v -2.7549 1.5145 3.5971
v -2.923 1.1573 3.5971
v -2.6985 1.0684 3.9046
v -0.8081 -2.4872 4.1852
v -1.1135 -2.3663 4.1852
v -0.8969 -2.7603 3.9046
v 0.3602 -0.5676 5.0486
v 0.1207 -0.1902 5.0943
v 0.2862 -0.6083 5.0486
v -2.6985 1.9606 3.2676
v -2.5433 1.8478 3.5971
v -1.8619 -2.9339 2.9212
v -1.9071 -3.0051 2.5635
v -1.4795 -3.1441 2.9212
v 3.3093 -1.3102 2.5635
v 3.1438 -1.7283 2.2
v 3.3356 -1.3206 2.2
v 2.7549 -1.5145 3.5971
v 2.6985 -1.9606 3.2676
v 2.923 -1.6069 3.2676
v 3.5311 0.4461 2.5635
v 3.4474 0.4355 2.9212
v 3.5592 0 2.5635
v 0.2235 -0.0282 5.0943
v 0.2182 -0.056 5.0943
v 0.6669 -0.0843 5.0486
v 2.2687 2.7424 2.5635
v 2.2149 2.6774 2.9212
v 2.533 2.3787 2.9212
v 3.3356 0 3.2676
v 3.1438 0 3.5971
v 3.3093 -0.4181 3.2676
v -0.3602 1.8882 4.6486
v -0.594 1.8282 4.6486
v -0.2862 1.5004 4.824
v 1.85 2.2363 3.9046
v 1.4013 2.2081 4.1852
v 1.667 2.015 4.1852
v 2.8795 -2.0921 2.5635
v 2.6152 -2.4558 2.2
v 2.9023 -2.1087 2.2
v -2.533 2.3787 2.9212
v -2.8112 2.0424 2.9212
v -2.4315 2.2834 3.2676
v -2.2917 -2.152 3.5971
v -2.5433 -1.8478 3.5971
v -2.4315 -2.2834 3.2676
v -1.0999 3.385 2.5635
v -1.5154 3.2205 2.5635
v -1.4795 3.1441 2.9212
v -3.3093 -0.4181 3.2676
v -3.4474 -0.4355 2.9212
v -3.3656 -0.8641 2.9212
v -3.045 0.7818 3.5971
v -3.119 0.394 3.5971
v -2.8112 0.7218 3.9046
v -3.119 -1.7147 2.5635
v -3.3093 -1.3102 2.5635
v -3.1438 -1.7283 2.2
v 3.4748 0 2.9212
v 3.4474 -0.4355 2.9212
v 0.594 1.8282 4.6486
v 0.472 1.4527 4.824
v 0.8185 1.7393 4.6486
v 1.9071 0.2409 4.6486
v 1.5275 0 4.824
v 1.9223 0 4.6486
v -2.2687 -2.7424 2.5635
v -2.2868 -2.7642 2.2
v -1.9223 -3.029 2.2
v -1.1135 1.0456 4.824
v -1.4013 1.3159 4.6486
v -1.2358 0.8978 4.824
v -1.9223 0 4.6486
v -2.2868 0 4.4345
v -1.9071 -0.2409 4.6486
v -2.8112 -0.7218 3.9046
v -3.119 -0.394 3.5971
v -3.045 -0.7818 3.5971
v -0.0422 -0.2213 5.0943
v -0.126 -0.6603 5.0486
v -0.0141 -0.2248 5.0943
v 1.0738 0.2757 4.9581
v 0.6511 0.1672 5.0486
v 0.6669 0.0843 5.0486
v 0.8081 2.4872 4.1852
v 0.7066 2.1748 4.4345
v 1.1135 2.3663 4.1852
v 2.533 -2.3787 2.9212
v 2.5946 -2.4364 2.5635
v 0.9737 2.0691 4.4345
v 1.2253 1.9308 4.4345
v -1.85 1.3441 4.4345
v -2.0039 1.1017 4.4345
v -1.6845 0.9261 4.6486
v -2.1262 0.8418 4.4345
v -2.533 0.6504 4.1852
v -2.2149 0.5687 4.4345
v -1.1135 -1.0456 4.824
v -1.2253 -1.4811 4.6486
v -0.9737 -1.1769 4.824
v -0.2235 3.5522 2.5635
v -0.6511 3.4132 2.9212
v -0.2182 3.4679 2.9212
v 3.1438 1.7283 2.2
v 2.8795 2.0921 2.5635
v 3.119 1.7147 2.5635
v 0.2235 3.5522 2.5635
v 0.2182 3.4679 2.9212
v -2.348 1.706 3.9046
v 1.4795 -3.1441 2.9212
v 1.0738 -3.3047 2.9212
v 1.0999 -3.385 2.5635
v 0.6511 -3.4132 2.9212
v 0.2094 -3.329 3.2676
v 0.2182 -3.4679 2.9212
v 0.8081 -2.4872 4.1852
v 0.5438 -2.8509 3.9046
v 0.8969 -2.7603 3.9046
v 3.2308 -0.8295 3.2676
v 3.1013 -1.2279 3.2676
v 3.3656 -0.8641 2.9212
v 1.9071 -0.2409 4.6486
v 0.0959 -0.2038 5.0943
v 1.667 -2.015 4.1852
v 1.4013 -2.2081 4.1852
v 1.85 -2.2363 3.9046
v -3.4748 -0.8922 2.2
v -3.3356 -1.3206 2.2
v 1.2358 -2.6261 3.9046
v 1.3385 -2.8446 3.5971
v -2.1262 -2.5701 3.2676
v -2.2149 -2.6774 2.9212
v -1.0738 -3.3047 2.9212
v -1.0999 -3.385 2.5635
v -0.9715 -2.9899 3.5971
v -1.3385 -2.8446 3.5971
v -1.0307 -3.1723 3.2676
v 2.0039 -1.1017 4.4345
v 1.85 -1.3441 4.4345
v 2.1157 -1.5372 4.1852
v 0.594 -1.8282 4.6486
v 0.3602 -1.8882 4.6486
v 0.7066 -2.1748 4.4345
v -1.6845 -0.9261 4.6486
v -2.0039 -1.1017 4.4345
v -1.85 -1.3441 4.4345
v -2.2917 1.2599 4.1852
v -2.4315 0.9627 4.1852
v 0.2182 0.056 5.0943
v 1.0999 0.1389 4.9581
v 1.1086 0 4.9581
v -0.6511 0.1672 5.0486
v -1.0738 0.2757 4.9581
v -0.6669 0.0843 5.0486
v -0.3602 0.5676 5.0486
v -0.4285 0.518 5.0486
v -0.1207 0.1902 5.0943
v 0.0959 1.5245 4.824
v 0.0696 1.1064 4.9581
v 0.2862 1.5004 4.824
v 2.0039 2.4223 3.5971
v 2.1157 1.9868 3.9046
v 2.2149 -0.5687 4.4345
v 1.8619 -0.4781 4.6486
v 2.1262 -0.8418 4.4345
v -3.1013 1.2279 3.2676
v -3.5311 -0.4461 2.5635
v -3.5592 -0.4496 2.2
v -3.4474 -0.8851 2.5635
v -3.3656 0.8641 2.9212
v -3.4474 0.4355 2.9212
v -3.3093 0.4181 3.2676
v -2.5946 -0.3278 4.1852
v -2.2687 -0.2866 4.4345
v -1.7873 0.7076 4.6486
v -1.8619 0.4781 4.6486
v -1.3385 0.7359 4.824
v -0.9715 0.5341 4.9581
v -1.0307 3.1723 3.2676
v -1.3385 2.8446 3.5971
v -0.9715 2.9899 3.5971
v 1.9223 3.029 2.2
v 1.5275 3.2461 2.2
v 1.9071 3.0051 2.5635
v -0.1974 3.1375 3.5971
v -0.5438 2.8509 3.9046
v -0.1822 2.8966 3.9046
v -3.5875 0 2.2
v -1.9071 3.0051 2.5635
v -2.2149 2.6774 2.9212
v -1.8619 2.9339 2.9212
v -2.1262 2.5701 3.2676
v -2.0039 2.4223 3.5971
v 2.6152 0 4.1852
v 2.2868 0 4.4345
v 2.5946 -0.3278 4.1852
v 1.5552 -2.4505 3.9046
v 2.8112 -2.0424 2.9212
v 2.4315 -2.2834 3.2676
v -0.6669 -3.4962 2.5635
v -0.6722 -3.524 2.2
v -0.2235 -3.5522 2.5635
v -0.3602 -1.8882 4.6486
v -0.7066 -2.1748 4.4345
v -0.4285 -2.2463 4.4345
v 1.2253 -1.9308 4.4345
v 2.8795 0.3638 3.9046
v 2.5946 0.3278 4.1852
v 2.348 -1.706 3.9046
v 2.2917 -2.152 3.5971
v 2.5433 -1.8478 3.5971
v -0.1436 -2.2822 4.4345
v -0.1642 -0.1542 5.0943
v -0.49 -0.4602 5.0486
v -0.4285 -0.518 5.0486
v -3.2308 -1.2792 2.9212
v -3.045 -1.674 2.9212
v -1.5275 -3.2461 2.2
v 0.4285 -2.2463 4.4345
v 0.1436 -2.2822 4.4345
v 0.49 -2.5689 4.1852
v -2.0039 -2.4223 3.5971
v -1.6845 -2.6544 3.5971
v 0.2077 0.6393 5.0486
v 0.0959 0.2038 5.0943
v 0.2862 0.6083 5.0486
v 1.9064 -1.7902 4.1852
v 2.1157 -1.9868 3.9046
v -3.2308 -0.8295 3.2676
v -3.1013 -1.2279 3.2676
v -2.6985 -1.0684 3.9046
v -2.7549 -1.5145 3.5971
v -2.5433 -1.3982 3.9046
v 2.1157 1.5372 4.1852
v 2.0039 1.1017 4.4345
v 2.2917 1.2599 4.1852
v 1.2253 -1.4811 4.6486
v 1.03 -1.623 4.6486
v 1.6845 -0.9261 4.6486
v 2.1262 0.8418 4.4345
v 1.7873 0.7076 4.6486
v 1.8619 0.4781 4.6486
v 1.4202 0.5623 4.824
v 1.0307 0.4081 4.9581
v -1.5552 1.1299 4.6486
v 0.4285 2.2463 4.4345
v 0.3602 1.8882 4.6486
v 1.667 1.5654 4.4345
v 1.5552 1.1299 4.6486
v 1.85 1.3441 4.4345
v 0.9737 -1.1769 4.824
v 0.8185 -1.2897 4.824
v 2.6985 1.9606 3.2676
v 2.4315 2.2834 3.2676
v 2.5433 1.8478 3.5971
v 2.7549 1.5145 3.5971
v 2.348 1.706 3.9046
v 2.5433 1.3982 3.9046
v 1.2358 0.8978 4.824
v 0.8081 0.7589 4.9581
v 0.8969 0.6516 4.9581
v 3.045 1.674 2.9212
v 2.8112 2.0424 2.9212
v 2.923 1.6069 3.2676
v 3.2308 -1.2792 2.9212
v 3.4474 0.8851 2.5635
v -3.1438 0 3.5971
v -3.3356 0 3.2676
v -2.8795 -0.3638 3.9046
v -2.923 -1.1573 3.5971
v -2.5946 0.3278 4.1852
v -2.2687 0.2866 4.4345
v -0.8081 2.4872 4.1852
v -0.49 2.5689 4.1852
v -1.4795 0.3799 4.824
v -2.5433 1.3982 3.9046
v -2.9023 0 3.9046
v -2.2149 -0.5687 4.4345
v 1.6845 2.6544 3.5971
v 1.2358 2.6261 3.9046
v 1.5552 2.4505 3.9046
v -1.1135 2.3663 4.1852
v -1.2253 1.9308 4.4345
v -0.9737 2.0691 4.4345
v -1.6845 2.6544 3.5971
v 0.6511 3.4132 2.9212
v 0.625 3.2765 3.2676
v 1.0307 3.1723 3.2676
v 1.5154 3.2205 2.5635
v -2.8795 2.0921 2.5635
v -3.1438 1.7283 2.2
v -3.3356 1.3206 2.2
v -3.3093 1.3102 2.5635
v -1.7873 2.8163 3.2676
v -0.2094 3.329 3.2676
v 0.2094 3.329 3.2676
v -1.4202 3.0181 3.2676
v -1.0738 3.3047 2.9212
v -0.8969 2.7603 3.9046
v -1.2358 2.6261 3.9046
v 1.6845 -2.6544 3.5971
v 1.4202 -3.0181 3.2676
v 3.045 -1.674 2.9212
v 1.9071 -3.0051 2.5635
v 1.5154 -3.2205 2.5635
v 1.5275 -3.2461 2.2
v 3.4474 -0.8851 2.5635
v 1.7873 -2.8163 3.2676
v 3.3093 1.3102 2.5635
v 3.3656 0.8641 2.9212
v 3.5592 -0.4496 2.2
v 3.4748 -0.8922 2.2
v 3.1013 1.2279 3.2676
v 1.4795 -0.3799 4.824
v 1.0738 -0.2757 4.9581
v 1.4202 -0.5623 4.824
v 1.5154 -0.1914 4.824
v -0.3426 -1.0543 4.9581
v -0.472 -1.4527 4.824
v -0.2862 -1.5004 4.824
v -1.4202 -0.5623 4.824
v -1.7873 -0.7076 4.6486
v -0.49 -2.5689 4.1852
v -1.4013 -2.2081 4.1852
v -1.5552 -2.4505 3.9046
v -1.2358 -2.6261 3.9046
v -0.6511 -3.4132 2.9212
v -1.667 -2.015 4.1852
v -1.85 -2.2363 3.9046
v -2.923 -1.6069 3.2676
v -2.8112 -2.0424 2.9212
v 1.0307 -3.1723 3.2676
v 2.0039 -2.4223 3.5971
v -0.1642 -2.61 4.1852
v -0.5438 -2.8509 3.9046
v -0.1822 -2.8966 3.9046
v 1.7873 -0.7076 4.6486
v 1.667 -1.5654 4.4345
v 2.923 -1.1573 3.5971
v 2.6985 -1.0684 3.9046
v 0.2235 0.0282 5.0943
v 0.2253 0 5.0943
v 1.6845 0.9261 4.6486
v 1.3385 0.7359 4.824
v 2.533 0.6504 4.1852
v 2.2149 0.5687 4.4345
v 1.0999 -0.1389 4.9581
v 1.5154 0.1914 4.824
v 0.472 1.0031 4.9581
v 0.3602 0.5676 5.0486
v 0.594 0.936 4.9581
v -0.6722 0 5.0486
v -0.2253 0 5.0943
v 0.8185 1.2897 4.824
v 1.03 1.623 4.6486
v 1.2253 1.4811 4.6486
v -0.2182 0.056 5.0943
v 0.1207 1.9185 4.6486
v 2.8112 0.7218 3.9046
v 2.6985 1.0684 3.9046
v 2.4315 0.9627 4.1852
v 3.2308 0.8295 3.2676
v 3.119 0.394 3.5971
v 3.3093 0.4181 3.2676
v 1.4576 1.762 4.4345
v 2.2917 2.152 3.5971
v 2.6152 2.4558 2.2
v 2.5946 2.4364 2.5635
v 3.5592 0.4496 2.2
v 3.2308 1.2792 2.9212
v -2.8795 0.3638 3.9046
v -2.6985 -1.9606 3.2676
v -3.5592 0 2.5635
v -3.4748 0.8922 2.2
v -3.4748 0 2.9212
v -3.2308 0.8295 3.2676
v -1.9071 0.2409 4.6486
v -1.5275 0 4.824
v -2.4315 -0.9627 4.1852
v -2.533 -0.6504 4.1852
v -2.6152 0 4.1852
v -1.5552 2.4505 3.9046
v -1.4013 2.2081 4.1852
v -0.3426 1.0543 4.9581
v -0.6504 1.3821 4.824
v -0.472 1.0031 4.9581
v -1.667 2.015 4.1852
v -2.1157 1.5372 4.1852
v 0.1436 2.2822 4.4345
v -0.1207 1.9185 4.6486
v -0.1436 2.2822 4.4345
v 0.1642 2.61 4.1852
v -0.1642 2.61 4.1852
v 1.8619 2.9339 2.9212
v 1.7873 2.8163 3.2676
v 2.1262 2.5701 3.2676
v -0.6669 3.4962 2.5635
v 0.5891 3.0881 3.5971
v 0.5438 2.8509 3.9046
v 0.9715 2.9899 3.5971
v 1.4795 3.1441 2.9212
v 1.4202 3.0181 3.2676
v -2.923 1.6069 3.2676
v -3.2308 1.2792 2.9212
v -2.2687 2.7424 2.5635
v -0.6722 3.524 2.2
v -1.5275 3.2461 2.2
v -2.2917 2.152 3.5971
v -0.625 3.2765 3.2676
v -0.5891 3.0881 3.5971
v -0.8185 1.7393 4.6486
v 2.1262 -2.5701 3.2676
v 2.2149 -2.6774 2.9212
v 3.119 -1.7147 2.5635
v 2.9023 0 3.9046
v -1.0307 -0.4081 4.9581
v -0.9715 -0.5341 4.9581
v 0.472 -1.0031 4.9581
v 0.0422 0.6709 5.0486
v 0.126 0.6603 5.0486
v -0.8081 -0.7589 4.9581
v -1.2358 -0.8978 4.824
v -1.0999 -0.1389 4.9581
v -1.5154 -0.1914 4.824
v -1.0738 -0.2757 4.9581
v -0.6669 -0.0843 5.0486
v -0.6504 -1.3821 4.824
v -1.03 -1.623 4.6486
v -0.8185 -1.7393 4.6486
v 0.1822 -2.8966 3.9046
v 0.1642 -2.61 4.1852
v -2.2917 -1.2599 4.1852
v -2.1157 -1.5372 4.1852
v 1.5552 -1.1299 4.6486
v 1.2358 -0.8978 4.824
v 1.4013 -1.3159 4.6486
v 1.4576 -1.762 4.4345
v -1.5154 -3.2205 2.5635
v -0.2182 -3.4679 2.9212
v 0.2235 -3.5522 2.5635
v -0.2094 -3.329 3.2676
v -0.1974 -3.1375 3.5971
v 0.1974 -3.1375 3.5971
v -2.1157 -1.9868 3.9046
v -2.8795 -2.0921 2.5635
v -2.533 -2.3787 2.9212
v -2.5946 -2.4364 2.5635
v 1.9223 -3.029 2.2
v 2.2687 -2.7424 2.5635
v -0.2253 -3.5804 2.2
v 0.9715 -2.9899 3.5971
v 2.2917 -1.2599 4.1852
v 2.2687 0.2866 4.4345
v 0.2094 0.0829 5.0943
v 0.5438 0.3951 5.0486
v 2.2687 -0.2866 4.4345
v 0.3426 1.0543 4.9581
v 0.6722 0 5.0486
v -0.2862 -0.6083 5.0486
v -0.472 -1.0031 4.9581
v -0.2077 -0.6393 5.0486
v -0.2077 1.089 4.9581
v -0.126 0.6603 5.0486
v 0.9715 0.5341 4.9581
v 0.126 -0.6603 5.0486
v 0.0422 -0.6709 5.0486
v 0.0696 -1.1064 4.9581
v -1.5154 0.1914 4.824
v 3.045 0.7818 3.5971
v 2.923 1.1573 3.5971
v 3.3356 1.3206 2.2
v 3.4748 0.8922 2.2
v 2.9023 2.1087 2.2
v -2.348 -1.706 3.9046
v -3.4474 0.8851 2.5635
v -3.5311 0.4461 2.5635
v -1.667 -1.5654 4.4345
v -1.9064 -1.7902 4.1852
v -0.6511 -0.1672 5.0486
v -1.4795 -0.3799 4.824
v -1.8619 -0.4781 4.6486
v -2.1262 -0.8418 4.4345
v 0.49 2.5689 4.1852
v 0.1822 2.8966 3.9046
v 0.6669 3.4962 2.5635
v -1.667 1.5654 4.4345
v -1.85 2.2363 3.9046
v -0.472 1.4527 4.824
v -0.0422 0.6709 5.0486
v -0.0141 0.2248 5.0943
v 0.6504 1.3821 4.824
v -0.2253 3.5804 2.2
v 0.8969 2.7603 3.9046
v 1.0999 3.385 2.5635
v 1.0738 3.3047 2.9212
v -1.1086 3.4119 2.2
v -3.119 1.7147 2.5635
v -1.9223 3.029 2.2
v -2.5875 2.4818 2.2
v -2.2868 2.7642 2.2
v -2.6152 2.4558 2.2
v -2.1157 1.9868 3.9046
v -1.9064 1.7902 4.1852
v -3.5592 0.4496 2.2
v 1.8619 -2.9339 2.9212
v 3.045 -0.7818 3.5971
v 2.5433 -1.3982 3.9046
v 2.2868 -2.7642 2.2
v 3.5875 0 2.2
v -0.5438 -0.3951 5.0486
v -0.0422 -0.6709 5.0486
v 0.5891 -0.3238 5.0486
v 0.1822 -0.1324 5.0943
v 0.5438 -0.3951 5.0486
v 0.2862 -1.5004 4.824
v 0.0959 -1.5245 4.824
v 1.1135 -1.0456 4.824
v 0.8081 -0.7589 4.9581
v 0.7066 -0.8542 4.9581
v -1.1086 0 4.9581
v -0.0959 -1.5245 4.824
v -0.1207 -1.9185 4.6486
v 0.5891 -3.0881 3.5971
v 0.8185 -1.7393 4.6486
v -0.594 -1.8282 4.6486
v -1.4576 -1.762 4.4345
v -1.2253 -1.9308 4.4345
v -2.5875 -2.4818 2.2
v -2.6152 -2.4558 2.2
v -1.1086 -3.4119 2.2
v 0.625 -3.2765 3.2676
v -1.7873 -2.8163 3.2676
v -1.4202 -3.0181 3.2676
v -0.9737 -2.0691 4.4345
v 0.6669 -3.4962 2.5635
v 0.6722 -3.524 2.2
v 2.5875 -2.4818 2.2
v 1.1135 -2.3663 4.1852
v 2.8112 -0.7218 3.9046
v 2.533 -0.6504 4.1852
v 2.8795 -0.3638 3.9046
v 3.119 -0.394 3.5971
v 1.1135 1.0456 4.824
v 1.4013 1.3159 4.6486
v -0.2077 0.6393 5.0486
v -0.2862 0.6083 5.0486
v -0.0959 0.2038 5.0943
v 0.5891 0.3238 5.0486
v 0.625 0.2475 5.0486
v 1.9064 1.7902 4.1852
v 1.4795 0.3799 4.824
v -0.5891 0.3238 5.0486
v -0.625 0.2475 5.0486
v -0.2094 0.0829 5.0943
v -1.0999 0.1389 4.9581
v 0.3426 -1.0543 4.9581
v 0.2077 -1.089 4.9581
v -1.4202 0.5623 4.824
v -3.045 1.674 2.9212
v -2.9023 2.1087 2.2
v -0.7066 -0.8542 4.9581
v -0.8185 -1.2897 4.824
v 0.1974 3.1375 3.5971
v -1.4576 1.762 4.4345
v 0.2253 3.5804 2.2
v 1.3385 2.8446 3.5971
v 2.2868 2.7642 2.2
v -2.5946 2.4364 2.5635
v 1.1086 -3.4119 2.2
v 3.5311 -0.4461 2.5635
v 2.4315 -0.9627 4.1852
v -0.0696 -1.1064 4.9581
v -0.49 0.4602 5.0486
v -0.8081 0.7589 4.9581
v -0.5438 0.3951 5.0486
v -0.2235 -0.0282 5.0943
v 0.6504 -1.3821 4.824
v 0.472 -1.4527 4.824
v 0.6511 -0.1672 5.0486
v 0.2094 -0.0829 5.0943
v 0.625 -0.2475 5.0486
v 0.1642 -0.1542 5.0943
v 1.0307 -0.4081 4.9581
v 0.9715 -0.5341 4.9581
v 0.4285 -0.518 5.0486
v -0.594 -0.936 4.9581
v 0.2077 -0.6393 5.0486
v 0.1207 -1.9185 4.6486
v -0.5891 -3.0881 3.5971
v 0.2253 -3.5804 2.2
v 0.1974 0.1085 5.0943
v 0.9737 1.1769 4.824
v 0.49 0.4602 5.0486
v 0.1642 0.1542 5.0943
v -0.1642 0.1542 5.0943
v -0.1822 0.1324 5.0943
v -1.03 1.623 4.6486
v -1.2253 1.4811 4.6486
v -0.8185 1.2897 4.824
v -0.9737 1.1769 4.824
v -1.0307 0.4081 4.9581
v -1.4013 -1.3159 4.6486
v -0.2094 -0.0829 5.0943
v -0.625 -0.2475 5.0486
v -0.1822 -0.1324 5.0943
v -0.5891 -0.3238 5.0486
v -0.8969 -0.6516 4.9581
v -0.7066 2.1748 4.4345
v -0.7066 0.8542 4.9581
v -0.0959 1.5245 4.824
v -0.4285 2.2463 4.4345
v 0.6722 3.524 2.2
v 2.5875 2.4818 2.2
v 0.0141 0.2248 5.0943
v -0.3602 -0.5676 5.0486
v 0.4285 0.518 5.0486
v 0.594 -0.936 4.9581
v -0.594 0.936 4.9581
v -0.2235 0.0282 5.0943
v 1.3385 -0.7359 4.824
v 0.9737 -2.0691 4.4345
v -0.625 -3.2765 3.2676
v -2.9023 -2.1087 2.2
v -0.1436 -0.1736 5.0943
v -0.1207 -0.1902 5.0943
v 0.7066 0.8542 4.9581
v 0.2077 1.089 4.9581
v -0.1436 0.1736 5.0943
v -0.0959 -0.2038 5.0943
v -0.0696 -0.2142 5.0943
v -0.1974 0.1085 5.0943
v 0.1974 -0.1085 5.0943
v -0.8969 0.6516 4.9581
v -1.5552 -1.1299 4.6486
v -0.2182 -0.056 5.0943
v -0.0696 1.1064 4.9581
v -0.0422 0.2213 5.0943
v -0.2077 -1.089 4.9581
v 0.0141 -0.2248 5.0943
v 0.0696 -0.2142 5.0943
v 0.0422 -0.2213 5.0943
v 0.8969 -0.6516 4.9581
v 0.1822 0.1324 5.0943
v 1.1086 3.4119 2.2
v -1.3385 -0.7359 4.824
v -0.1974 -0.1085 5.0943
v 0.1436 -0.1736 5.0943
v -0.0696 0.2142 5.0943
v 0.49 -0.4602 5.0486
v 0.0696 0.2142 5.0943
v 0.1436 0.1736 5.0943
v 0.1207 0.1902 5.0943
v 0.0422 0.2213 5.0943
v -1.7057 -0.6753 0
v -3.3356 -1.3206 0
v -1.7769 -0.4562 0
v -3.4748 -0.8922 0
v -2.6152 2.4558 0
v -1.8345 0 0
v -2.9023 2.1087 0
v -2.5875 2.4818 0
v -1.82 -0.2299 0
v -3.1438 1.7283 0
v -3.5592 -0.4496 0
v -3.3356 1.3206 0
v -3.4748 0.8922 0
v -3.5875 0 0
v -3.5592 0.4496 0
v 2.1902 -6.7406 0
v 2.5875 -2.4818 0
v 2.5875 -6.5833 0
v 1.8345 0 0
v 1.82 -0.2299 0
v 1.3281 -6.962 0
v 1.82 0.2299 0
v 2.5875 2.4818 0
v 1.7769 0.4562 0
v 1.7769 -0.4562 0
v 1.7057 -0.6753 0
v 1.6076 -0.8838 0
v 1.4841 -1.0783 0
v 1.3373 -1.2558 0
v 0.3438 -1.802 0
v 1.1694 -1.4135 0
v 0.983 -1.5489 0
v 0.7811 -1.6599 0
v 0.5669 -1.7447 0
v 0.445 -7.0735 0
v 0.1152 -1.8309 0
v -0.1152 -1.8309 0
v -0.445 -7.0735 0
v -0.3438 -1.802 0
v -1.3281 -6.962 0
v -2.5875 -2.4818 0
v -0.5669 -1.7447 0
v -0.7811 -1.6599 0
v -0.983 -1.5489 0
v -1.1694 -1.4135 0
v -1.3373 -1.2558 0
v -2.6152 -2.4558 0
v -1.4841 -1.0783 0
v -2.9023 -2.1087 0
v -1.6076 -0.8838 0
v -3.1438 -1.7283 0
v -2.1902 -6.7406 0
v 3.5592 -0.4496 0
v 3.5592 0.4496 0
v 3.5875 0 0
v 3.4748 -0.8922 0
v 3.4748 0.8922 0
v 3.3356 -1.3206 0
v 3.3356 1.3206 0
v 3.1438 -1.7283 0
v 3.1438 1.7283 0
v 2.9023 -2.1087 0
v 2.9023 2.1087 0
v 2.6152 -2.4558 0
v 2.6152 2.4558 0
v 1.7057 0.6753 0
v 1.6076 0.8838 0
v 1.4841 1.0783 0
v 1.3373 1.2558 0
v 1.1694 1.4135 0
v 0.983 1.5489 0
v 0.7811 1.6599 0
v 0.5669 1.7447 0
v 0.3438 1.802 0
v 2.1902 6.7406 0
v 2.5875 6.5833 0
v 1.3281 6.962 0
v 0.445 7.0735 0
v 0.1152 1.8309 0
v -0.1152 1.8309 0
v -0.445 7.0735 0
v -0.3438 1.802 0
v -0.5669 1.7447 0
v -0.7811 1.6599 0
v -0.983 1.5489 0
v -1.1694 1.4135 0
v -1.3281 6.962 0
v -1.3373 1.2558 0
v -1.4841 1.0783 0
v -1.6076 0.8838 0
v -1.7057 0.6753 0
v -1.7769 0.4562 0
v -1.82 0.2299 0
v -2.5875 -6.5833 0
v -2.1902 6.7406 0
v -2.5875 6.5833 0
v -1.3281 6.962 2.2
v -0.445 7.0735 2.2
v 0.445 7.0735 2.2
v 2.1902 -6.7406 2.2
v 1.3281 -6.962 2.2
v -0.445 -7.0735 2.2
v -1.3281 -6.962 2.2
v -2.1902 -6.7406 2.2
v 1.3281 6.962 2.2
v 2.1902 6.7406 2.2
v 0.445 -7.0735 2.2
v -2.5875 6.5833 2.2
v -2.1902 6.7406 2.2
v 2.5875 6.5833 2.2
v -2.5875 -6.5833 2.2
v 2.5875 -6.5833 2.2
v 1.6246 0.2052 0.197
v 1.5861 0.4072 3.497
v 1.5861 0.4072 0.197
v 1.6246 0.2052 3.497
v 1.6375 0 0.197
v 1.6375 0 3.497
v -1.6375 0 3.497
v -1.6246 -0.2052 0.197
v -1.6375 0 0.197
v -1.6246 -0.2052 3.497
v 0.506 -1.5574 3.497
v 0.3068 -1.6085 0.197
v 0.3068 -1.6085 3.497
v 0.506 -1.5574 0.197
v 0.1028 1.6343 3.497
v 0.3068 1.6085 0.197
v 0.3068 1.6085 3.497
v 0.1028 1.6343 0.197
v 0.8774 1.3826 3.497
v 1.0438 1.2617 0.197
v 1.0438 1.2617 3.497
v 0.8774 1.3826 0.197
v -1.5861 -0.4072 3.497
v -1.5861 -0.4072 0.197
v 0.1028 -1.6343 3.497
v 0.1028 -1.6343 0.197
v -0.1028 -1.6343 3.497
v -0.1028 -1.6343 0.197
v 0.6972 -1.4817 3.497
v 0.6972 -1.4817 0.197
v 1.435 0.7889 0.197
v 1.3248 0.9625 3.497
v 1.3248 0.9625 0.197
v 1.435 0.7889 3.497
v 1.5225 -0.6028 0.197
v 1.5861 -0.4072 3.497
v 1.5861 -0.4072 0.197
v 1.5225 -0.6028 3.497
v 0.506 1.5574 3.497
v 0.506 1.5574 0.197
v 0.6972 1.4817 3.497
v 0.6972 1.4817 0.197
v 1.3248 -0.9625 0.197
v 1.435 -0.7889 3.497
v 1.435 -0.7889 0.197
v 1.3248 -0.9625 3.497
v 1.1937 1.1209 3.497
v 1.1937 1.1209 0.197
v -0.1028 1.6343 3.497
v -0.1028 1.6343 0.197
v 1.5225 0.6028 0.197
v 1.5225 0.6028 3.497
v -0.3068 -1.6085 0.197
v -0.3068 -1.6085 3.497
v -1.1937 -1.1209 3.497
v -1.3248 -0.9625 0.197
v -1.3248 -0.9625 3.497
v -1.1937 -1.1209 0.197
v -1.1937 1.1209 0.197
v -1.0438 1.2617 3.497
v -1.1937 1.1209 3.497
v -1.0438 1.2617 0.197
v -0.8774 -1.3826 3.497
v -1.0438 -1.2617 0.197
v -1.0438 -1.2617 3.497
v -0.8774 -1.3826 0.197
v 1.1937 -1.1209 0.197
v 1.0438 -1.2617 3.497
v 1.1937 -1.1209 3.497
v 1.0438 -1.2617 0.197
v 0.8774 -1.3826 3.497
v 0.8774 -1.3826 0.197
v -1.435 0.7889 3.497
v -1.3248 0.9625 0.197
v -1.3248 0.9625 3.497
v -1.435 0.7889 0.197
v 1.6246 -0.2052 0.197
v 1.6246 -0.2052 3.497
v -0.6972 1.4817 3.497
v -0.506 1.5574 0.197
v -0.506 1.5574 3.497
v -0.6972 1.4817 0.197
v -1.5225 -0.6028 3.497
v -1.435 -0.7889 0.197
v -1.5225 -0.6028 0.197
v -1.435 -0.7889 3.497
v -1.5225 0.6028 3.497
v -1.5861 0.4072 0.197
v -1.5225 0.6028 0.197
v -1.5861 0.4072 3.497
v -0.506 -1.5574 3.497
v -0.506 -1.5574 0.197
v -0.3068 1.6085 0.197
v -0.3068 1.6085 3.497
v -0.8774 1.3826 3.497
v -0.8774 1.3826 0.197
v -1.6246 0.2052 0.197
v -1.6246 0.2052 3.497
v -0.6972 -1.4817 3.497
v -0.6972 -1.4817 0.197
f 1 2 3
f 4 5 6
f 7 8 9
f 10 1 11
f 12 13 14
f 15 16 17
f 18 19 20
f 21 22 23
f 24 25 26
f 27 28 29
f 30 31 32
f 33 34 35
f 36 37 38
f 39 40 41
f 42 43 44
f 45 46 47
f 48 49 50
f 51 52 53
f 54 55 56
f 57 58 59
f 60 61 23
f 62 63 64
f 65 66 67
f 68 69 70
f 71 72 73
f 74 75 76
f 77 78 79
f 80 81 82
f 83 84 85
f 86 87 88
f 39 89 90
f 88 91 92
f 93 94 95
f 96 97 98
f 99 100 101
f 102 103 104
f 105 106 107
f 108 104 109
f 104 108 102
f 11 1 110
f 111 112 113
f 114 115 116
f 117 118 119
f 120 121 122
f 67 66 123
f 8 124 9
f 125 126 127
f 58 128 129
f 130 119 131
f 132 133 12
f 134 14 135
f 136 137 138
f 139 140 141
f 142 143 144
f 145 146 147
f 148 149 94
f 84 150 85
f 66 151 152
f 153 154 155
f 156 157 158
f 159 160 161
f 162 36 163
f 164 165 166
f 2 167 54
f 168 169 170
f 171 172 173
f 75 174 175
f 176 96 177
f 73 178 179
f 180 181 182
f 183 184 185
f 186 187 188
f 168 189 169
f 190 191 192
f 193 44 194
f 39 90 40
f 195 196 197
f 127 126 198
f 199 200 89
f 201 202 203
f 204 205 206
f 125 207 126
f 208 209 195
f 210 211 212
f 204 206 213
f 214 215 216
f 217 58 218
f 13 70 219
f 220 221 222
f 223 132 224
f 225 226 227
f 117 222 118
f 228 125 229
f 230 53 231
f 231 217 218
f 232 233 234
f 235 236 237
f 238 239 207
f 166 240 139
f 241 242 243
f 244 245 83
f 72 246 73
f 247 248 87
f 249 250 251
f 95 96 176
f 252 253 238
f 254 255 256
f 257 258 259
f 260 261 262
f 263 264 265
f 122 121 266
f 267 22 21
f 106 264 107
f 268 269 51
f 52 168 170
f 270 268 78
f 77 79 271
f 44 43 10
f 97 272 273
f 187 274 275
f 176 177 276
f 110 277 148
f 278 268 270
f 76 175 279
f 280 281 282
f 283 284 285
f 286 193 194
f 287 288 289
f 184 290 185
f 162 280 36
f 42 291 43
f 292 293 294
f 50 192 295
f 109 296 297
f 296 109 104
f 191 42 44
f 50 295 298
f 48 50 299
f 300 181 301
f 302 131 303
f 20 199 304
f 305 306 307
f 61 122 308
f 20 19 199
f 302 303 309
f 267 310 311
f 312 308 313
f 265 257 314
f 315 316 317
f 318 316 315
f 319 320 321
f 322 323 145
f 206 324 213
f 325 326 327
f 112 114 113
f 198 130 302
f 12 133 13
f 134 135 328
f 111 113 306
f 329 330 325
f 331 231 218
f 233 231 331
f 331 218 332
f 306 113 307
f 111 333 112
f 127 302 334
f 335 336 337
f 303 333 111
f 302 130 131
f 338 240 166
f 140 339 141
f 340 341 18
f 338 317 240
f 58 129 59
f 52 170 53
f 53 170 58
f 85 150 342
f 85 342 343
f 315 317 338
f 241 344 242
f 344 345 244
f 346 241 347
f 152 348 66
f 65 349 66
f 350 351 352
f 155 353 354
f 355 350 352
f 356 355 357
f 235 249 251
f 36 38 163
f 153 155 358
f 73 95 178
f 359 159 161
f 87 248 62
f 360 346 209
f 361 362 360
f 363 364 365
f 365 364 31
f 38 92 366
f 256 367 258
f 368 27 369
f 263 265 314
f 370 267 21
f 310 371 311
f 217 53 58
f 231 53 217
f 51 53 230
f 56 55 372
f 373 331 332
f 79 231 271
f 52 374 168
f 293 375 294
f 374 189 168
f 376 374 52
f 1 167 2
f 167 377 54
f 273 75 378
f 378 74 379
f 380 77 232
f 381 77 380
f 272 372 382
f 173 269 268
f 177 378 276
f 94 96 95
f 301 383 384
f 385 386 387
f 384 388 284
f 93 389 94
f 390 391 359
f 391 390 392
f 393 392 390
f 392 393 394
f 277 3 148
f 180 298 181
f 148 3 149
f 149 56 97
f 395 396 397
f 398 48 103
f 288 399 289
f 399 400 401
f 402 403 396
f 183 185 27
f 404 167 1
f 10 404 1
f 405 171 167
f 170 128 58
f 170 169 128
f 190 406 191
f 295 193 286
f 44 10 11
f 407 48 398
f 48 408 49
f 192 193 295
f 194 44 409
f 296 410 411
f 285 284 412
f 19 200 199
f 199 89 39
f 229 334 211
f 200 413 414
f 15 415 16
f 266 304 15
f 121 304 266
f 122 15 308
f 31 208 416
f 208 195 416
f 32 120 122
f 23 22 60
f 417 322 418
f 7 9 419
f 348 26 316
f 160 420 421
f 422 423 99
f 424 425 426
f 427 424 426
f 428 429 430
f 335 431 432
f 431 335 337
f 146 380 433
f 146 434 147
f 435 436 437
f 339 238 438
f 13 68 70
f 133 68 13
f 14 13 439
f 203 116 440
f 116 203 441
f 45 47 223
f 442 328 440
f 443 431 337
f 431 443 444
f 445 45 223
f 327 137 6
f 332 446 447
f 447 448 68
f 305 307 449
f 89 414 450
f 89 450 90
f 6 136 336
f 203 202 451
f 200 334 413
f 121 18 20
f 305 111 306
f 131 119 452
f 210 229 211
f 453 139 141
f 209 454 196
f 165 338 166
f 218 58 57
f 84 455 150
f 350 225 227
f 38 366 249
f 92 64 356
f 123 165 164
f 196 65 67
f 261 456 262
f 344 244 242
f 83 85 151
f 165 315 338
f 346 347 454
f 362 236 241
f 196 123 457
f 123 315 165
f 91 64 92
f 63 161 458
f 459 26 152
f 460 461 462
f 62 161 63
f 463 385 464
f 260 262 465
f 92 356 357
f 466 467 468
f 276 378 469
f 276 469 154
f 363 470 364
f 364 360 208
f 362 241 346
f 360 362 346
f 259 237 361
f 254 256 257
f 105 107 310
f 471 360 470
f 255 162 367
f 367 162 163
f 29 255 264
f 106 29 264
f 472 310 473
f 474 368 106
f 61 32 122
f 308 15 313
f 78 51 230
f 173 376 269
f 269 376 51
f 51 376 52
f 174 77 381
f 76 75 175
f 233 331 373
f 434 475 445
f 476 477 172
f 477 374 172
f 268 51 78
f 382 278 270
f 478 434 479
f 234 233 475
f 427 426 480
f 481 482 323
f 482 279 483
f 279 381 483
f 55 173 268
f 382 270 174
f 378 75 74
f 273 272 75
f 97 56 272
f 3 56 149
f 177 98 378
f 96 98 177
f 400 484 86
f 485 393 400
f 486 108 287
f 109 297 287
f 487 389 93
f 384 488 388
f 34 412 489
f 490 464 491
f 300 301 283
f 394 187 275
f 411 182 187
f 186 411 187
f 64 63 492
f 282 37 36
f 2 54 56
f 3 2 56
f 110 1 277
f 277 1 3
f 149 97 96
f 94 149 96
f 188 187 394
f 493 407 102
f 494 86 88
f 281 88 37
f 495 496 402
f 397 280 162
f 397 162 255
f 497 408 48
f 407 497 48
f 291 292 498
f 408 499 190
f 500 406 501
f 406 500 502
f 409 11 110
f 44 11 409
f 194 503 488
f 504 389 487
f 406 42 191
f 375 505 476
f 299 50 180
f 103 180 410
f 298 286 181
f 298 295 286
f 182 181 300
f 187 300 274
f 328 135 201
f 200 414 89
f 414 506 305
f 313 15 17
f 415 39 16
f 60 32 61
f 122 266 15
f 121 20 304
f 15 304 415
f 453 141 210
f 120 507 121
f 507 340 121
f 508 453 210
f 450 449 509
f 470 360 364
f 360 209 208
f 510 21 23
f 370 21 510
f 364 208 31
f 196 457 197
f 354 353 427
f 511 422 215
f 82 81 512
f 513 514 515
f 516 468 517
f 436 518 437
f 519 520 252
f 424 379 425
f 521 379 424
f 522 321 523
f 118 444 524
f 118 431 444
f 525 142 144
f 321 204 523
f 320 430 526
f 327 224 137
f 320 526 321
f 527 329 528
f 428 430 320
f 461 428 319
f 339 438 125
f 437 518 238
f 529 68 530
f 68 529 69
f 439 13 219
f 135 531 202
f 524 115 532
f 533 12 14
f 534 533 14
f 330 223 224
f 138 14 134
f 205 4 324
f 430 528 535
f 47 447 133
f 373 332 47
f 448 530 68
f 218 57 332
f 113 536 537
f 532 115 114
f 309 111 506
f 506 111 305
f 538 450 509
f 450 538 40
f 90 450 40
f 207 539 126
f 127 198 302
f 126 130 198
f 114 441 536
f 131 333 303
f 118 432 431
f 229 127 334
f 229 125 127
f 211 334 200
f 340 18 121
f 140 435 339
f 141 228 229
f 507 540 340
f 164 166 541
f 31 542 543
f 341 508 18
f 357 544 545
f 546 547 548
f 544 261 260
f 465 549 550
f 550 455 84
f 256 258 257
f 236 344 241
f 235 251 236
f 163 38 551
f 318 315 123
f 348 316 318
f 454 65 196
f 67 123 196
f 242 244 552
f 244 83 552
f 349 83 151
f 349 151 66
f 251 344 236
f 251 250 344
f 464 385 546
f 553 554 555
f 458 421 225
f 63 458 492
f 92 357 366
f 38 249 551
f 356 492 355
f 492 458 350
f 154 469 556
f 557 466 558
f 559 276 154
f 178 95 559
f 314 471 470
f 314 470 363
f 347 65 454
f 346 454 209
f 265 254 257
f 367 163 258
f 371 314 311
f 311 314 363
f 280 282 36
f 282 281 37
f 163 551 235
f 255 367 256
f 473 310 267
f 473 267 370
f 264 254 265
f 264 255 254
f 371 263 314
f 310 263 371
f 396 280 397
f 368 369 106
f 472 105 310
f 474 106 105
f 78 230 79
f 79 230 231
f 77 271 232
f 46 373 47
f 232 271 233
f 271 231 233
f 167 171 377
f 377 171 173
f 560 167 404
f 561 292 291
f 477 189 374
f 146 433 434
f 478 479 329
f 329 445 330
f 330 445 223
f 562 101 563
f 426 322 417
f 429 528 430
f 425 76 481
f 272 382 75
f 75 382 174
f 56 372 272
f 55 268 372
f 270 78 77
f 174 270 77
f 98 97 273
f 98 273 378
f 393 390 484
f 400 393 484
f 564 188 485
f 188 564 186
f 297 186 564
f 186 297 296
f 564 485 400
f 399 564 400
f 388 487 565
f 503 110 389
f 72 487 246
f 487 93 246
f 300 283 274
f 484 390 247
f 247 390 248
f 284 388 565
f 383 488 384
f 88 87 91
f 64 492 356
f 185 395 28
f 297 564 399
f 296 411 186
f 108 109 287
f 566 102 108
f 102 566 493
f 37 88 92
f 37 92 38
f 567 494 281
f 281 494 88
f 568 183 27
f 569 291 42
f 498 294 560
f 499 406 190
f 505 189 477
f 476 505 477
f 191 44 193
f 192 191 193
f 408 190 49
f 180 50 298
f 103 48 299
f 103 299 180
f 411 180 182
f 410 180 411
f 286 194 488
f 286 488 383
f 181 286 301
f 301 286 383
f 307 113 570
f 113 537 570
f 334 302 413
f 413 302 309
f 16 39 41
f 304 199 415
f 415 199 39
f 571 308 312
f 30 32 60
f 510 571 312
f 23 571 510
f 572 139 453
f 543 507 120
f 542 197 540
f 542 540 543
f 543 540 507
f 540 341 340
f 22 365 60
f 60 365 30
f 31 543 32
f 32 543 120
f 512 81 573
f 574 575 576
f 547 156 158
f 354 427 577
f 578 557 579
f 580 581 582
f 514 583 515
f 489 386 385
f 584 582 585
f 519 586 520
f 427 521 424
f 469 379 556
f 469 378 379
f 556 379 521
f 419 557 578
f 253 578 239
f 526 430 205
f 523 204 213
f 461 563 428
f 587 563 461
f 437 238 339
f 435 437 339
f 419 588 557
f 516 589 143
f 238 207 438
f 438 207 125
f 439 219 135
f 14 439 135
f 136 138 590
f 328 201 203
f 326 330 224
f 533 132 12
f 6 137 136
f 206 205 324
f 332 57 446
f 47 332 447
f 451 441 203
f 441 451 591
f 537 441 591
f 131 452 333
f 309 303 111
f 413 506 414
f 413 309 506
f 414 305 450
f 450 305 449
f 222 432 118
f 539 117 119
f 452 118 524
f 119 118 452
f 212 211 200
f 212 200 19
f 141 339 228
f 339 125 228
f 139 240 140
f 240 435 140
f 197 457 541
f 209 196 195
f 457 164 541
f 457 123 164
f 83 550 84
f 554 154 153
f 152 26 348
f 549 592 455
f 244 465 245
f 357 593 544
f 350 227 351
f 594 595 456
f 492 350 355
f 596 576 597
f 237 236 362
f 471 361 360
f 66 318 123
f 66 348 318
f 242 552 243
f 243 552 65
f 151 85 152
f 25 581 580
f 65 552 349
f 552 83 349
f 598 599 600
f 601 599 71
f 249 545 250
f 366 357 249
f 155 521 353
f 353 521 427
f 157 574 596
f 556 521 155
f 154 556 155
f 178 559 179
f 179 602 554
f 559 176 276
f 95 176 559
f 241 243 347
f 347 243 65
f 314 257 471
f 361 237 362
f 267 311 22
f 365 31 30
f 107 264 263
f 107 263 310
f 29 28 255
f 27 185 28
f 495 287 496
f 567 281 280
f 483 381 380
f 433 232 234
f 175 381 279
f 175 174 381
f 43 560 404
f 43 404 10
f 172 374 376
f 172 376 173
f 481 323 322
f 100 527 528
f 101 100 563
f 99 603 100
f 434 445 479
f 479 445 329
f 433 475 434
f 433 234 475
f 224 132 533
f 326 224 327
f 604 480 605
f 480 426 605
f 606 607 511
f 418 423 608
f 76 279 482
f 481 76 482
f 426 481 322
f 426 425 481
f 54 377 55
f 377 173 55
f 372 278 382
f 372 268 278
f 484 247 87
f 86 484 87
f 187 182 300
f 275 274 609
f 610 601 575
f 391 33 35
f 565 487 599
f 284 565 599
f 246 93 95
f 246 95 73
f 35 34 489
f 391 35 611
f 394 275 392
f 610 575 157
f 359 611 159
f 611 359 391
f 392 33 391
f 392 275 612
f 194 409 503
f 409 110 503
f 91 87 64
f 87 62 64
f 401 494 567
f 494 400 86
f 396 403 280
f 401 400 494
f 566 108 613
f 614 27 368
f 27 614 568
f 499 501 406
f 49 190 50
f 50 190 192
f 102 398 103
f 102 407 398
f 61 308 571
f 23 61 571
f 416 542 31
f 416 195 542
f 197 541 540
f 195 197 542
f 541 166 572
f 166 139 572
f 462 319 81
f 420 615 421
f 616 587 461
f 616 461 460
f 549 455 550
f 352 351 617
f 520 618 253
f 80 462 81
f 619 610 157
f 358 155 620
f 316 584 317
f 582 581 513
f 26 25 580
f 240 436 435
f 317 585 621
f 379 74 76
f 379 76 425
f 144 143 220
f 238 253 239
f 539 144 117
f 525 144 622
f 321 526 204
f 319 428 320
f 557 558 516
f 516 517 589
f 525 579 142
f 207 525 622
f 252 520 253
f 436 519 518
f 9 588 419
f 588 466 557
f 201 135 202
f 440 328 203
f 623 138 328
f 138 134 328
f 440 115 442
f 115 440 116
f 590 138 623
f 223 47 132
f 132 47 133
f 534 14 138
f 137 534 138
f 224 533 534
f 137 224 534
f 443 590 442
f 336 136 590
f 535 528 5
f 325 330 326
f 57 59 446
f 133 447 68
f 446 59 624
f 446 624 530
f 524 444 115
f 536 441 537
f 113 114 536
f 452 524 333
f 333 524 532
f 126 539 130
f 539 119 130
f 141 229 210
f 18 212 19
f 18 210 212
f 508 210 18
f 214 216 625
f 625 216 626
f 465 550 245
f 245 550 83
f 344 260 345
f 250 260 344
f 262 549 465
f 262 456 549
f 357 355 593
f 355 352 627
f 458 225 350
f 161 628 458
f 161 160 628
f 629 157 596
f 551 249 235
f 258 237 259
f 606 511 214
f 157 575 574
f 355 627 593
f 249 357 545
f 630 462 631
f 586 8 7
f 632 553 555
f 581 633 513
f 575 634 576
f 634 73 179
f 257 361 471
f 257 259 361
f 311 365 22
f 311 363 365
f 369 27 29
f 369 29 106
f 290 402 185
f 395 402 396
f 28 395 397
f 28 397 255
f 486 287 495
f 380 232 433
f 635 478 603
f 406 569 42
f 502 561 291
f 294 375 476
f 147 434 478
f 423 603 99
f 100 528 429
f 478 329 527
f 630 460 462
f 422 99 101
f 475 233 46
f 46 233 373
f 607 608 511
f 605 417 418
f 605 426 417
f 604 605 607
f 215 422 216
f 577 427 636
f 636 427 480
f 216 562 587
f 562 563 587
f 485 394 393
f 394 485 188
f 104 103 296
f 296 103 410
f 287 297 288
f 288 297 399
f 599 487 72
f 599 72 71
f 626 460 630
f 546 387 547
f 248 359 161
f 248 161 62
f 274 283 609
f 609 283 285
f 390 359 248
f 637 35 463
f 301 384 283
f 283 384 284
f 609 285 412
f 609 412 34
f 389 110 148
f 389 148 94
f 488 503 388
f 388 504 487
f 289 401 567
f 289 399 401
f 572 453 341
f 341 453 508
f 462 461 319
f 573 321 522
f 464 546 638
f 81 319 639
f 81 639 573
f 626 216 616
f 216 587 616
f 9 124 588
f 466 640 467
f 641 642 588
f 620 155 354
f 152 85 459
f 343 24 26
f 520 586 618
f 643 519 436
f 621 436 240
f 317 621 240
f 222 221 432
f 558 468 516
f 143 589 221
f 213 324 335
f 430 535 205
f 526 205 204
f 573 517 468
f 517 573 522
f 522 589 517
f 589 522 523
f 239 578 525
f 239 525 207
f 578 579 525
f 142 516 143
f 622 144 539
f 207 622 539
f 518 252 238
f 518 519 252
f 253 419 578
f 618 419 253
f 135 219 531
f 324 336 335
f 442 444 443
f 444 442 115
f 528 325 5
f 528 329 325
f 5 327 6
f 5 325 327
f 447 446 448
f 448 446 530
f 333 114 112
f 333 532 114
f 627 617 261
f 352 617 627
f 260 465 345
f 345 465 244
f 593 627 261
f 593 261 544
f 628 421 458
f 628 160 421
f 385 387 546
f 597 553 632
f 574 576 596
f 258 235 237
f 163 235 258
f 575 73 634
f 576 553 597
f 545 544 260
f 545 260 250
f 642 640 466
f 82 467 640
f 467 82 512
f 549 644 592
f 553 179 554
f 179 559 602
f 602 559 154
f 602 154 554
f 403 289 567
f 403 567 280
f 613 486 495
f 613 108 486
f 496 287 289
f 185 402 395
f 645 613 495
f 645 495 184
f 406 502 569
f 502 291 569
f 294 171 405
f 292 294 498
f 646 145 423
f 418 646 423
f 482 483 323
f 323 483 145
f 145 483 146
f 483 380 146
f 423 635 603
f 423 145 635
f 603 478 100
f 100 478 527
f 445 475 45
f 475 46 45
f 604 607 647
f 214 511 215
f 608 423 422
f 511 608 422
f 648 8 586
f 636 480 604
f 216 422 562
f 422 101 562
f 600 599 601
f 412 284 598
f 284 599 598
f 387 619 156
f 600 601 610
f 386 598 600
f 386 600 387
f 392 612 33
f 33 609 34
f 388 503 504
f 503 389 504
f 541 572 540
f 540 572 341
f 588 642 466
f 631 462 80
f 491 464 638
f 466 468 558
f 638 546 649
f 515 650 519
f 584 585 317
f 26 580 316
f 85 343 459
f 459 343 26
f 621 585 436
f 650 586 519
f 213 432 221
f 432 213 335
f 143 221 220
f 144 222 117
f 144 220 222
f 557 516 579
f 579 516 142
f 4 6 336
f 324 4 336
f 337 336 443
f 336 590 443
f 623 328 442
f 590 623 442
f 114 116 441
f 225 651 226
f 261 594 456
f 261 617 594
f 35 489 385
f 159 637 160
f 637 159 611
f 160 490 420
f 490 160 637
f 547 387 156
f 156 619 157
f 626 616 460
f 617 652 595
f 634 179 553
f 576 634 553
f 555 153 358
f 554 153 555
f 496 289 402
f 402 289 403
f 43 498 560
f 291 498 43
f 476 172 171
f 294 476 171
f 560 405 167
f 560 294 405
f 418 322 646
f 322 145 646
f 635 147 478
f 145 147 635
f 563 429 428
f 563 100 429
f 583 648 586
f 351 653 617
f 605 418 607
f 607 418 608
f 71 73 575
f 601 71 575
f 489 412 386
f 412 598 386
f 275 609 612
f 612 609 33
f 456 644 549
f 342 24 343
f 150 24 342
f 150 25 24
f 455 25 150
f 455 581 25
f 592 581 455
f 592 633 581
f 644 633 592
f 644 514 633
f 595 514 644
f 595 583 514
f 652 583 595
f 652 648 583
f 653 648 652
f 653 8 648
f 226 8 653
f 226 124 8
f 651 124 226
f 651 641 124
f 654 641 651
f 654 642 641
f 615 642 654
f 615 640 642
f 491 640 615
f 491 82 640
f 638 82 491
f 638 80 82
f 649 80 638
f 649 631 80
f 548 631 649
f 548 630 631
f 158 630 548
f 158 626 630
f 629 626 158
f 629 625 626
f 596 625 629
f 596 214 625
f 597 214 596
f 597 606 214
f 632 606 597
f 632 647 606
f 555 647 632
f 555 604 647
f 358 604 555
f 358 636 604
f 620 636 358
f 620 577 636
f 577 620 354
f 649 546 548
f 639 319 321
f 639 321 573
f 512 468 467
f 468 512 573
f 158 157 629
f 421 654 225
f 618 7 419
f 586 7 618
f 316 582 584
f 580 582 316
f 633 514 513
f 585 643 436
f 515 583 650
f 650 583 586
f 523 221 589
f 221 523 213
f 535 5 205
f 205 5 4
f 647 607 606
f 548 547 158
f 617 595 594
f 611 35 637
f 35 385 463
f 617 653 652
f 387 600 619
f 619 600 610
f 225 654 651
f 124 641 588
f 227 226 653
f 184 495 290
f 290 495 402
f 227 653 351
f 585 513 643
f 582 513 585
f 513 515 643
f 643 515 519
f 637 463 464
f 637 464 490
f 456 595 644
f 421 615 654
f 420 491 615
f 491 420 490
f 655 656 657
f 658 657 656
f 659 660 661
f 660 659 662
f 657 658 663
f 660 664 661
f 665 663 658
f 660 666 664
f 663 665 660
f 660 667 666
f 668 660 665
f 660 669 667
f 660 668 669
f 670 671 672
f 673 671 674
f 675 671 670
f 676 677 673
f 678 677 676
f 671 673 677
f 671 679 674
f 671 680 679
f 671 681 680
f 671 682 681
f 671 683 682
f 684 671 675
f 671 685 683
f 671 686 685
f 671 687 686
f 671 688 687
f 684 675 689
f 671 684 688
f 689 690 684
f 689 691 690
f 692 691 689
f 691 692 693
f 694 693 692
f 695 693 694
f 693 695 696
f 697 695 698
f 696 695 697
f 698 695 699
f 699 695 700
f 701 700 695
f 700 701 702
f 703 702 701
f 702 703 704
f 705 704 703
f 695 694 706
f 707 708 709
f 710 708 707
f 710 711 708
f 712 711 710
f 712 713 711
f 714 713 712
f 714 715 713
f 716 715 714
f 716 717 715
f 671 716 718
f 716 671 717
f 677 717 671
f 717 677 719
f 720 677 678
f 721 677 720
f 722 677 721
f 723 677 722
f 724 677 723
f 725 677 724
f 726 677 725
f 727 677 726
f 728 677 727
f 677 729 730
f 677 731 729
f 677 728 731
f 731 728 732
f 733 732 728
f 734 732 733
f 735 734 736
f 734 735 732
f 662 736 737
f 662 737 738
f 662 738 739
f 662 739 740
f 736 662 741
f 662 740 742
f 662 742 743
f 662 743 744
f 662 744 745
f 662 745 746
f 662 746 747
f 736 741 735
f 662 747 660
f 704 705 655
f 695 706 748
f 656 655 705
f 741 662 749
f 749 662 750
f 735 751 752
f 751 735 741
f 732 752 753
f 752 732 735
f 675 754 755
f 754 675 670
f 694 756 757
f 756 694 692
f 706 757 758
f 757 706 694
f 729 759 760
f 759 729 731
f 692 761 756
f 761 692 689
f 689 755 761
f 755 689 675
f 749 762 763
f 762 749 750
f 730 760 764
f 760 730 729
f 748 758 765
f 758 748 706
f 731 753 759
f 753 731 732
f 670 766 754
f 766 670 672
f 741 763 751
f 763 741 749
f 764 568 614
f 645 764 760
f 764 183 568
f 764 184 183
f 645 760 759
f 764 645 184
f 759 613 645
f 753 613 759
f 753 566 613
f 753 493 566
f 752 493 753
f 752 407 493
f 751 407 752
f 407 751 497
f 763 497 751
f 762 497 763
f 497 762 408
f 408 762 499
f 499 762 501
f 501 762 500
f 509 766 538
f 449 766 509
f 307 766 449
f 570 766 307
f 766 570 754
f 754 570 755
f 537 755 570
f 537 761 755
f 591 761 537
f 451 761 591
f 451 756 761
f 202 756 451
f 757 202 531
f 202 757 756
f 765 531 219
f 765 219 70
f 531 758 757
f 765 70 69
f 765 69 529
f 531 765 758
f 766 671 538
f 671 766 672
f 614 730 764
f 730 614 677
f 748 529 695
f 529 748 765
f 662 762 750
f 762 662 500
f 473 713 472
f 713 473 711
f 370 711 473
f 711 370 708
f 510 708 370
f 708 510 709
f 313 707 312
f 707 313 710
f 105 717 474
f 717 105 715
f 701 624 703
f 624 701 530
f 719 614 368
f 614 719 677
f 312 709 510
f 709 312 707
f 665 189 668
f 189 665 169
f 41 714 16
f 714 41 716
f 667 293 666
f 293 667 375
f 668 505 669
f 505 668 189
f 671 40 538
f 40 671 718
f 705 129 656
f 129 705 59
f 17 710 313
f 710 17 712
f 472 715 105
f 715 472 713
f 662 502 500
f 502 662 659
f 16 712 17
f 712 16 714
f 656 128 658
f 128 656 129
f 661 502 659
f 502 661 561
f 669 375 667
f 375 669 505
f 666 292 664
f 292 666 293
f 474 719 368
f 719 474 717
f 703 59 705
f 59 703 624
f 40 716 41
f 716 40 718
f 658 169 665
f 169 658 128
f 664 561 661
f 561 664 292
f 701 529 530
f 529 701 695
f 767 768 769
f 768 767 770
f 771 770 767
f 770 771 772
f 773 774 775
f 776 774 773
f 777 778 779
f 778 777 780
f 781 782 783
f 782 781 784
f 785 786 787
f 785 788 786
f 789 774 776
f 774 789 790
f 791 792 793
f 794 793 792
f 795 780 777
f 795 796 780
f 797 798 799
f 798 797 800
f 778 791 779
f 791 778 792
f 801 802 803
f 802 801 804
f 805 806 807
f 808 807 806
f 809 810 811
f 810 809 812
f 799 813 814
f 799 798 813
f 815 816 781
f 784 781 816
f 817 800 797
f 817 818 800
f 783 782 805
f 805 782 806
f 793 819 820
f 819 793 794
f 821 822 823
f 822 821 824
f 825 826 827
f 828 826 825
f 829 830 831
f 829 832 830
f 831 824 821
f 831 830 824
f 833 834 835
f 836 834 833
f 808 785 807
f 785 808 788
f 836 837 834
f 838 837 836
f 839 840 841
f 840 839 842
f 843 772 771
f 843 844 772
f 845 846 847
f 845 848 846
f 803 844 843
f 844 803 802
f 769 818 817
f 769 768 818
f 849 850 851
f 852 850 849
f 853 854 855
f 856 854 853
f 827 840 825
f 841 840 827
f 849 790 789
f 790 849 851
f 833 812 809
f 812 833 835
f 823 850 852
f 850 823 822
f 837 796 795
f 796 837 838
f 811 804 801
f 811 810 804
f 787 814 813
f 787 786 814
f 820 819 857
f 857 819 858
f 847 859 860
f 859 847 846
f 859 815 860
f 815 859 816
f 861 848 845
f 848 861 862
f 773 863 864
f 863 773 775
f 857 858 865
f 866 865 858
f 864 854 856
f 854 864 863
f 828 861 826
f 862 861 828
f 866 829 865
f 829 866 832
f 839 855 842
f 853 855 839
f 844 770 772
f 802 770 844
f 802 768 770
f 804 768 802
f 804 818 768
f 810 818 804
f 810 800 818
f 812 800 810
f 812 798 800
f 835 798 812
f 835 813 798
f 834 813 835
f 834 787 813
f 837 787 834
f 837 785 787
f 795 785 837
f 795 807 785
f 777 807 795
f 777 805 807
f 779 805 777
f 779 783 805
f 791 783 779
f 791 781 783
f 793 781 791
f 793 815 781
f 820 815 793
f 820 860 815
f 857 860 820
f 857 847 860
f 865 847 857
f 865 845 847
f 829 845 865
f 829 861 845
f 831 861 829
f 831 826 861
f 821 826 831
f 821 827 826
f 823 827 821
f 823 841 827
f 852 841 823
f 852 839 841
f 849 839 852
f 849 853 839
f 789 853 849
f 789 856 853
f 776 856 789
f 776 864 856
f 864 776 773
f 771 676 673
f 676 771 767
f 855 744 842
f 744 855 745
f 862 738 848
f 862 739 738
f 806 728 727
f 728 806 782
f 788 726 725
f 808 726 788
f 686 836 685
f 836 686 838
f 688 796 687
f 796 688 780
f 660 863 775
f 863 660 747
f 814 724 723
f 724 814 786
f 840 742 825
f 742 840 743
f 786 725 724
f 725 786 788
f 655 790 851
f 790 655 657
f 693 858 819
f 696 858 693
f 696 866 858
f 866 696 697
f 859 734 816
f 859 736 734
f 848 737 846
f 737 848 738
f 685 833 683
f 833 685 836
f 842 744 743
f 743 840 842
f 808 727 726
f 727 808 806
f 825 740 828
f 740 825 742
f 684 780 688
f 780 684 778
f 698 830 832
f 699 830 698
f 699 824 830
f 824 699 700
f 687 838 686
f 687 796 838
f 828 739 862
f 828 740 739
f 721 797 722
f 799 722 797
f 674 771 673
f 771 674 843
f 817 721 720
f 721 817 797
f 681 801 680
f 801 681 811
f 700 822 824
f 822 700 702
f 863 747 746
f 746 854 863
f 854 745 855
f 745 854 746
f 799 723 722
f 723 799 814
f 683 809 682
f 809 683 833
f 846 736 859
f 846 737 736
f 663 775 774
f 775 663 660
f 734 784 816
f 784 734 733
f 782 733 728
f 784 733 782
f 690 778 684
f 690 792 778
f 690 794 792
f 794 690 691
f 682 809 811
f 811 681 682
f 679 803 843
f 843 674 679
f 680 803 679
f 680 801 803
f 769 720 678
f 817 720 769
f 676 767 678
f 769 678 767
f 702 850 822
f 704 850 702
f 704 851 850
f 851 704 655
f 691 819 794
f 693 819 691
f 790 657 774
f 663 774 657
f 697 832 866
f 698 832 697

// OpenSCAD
// file: common.scad
$fa = 10;
$fs = 0.2;
eps = 0.003;
$zstep = 0.2;

// An inward chamfer sufficient to prevent elephant's foot.
foot = 0.4;

// FINDINGS FROM CLEARANCE TEST
//
// Consider a vertical hole of width X, a layer height of 0.2, and a vertical
// post.
//   * A post of diameter X will not fit in.
//   * A post of diameter X-0.1 will fit in, but is very hard to slide in or out.
//     This is probably due mostly to the transverse grain of the print.
//     It will rotate, but with some resistance.
//   * A post of diameter X-0.2 slides in and out easily. It rotates easily, but
//     still has noticeable resistance at some points.
//   * A post of diameter X-0.3 rotates freely. It also has noticeable play
//     from side to side.
//
// Clearances are expressed as the total across both sides of a joint.
tight = 0.1;  // Intended for stationary joints.
snug = 0.2;   // Moves, but with some resistance.
loose = 0.3;  // Free movement.
extra_loose = 0.4;

// A brim is a 0.2mm layer printed near an edge which is likely to warp.
// The edge should be chamfered outwards at 45 degrees. The brim should
// be placed this far from the bottom of the edge, so it barely touches
// the chamfer.
brim_offset = 0.3;

// Menards 5/8 x 2-3/4 x 0.04 WG compression spring.
spring_od = 5/8 * 25.4;
// Subtract 10 from the relaxed length so everything is slightly tensioned
// all the time.
spring_max_length = 2.75 * 25.4 - 10;
spring_min_length = 16;  // Approximate.

// Menards 1/4 inch aluminum rod.
roller_diameter = 6.7;
roller_cavity_diameter = roller_diameter + loose;

// 550 paracord. Make this wide enough to accommodate a melted end.
string_diameter = 4.5;

// Standard spring tube.
tube_id = spring_od + 0.7;

module octagon(diameter) {
  intersection_for(a = [0, 45])
    rotate([0, 0, a])
      square(diameter, center=true);
}

// A cylinder with chamfered or flared ends, useful for dealing with
// elephant's foot on pins or holes.
module flare_cylinder(height, radius, flare_top, flare_bottom) {
  translate([0, 0, abs(flare_bottom)-eps])
    cylinder(height-abs(flare_bottom)-abs(flare_top)+eps, radius, radius);

  // Bottom flare.
  linear_extrude(abs(flare_bottom), scale=radius/(radius-flare_bottom))
    circle(radius-flare_bottom);
  
  // Top flare.
  translate([0, 0, height-abs(flare_top)])
    linear_extrude(abs(flare_top), scale=(radius-flare_top)/radius)
      circle(radius);
}

// A cube with a chamfered or flared bottom end, useful for dealing
// with elephant's foot on pins or holes.
module flare_cube(dims, flare) {
  translate([0, 0, abs(flare)-eps])
    cube([dims.x, dims.y, dims.z - abs(flare) + eps]);

  translate([dims.x/2, dims.y/2, 0])
    linear_extrude(abs(flare), scale=[dims.x/(dims.x-2*flare), dims.y/(dims.y-2*flare)])
      translate([-(dims.x-2*flare)/2, -(dims.y-2*flare)/2, abs(flare)-eps])
        square([dims.x-2*flare, dims.y-2*flare]);
}

// An approximate circle which can be printed on its side.
module circle_ish(r) {
  // Safe overhang angle.
  q = 45;
  
  intersection() {
    // Add 0.2 (one print layer) in case the bridge is messy and hangs
    // down.
    square(2*r+0.2, center=true);
    hull() {
      circle(r);
      for (a = [-1, 1])
        translate([0, a*r/cos(q), 0])
          square(eps, center=true);
    }
  }
}

// Depth of the sockets used as glue aids.
socket_depth = 5;

module socket() {
  translate([-1.5, -1.5, -eps])
    flare_cube([3, 3, socket_depth], -foot);
}

module lug() {
  flare_cube([3-snug, 3-snug, 2*socket_depth-2], foot);
}

// Nerf darts are 0.50 cal.
dart_diameter = 12.7;
dart_length = 72;

module octahedron(major_radius=1) {
  // Top and bottom halves.
  for (a = [-1, 1])
    scale([1, 1, a])
      // Extrude a square into a pyramid.
      linear_extrude(major_radius, scale=0)
        rotate([0, 0, 45])
          square(sqrt(2)*major_radius, center=true);
}

module chamfered_cube(dims, chamfer=1) {
  assert(dims.x >= 2*chamfer);
  assert(dims.y >= 2*chamfer);
  assert(dims.z >= 2*chamfer);

  hull()
    for (a = [0, 1], b = [0, 1], c = [0, 1])
        translate([
          (dims.x - 2*chamfer) * a + chamfer,
          (dims.y - 2*chamfer) * b + chamfer,
          (dims.z - 2*chamfer) * c + chamfer
        ])
          octahedron(chamfer);
}
// main file
// Retention washer for 1/8" steel pins.

include <common.scad>

pin_diameter = 3.175;
pin_cavity_diameter = pin_diameter + 0.1;
washer_body_diameter = pin_diameter + 4;
hole_depth = 3.5;
ceiling_thickness = 1.6;
flange_thickness = 2.2;
flange_length = 3.5;
flange_width = washer_body_diameter - 2;

module washer() {
  $fn = 50;
  
  difference() {
    union() {
      cylinder(flange_thickness, d=washer_body_diameter);
      
      intersection() {
        translate([0, 0, flange_thickness])
          scale([1, 1, (hole_depth + ceiling_thickness - flange_thickness)*2/washer_body_diameter])
            sphere(washer_body_diameter/2);
        translate([0, 0, 10])
          cube(20, center=true);
      }
      
      intersection() {
        cylinder(flange_thickness, d=washer_body_diameter+2*flange_length);
        cube([flange_width, 20, 20], center=true);
      }
    }
    
    translate([0, 0, -eps]) {
      cylinder(hole_depth, d=pin_cavity_diameter);
      cylinder(pin_cavity_diameter/2+0.2, d1=pin_cavity_diameter+0.4, d2=0);
    }
  }
}

module washer_claw() {
  $fn = 50;
  ceiling = 1.4;
  wall = 2;

  difference() {
    intersection() {
      translate([-flange_width/2, washer_body_diameter/2, -1])
        chamfered_cube([flange_width+wall, flange_length+wall, 1+flange_thickness+0.2+ceiling], 0.6);
      translate([0, 0, 10])
        cube(20, center=true);
    }
    intersection() {
      translate([0, 0, -eps])
        cylinder(flange_thickness+0.2, d=washer_body_diameter+2*flange_length+0.2);
      cube([flange_width+2*eps, 20, 20], center=true);
    }
  }
}

washer();
